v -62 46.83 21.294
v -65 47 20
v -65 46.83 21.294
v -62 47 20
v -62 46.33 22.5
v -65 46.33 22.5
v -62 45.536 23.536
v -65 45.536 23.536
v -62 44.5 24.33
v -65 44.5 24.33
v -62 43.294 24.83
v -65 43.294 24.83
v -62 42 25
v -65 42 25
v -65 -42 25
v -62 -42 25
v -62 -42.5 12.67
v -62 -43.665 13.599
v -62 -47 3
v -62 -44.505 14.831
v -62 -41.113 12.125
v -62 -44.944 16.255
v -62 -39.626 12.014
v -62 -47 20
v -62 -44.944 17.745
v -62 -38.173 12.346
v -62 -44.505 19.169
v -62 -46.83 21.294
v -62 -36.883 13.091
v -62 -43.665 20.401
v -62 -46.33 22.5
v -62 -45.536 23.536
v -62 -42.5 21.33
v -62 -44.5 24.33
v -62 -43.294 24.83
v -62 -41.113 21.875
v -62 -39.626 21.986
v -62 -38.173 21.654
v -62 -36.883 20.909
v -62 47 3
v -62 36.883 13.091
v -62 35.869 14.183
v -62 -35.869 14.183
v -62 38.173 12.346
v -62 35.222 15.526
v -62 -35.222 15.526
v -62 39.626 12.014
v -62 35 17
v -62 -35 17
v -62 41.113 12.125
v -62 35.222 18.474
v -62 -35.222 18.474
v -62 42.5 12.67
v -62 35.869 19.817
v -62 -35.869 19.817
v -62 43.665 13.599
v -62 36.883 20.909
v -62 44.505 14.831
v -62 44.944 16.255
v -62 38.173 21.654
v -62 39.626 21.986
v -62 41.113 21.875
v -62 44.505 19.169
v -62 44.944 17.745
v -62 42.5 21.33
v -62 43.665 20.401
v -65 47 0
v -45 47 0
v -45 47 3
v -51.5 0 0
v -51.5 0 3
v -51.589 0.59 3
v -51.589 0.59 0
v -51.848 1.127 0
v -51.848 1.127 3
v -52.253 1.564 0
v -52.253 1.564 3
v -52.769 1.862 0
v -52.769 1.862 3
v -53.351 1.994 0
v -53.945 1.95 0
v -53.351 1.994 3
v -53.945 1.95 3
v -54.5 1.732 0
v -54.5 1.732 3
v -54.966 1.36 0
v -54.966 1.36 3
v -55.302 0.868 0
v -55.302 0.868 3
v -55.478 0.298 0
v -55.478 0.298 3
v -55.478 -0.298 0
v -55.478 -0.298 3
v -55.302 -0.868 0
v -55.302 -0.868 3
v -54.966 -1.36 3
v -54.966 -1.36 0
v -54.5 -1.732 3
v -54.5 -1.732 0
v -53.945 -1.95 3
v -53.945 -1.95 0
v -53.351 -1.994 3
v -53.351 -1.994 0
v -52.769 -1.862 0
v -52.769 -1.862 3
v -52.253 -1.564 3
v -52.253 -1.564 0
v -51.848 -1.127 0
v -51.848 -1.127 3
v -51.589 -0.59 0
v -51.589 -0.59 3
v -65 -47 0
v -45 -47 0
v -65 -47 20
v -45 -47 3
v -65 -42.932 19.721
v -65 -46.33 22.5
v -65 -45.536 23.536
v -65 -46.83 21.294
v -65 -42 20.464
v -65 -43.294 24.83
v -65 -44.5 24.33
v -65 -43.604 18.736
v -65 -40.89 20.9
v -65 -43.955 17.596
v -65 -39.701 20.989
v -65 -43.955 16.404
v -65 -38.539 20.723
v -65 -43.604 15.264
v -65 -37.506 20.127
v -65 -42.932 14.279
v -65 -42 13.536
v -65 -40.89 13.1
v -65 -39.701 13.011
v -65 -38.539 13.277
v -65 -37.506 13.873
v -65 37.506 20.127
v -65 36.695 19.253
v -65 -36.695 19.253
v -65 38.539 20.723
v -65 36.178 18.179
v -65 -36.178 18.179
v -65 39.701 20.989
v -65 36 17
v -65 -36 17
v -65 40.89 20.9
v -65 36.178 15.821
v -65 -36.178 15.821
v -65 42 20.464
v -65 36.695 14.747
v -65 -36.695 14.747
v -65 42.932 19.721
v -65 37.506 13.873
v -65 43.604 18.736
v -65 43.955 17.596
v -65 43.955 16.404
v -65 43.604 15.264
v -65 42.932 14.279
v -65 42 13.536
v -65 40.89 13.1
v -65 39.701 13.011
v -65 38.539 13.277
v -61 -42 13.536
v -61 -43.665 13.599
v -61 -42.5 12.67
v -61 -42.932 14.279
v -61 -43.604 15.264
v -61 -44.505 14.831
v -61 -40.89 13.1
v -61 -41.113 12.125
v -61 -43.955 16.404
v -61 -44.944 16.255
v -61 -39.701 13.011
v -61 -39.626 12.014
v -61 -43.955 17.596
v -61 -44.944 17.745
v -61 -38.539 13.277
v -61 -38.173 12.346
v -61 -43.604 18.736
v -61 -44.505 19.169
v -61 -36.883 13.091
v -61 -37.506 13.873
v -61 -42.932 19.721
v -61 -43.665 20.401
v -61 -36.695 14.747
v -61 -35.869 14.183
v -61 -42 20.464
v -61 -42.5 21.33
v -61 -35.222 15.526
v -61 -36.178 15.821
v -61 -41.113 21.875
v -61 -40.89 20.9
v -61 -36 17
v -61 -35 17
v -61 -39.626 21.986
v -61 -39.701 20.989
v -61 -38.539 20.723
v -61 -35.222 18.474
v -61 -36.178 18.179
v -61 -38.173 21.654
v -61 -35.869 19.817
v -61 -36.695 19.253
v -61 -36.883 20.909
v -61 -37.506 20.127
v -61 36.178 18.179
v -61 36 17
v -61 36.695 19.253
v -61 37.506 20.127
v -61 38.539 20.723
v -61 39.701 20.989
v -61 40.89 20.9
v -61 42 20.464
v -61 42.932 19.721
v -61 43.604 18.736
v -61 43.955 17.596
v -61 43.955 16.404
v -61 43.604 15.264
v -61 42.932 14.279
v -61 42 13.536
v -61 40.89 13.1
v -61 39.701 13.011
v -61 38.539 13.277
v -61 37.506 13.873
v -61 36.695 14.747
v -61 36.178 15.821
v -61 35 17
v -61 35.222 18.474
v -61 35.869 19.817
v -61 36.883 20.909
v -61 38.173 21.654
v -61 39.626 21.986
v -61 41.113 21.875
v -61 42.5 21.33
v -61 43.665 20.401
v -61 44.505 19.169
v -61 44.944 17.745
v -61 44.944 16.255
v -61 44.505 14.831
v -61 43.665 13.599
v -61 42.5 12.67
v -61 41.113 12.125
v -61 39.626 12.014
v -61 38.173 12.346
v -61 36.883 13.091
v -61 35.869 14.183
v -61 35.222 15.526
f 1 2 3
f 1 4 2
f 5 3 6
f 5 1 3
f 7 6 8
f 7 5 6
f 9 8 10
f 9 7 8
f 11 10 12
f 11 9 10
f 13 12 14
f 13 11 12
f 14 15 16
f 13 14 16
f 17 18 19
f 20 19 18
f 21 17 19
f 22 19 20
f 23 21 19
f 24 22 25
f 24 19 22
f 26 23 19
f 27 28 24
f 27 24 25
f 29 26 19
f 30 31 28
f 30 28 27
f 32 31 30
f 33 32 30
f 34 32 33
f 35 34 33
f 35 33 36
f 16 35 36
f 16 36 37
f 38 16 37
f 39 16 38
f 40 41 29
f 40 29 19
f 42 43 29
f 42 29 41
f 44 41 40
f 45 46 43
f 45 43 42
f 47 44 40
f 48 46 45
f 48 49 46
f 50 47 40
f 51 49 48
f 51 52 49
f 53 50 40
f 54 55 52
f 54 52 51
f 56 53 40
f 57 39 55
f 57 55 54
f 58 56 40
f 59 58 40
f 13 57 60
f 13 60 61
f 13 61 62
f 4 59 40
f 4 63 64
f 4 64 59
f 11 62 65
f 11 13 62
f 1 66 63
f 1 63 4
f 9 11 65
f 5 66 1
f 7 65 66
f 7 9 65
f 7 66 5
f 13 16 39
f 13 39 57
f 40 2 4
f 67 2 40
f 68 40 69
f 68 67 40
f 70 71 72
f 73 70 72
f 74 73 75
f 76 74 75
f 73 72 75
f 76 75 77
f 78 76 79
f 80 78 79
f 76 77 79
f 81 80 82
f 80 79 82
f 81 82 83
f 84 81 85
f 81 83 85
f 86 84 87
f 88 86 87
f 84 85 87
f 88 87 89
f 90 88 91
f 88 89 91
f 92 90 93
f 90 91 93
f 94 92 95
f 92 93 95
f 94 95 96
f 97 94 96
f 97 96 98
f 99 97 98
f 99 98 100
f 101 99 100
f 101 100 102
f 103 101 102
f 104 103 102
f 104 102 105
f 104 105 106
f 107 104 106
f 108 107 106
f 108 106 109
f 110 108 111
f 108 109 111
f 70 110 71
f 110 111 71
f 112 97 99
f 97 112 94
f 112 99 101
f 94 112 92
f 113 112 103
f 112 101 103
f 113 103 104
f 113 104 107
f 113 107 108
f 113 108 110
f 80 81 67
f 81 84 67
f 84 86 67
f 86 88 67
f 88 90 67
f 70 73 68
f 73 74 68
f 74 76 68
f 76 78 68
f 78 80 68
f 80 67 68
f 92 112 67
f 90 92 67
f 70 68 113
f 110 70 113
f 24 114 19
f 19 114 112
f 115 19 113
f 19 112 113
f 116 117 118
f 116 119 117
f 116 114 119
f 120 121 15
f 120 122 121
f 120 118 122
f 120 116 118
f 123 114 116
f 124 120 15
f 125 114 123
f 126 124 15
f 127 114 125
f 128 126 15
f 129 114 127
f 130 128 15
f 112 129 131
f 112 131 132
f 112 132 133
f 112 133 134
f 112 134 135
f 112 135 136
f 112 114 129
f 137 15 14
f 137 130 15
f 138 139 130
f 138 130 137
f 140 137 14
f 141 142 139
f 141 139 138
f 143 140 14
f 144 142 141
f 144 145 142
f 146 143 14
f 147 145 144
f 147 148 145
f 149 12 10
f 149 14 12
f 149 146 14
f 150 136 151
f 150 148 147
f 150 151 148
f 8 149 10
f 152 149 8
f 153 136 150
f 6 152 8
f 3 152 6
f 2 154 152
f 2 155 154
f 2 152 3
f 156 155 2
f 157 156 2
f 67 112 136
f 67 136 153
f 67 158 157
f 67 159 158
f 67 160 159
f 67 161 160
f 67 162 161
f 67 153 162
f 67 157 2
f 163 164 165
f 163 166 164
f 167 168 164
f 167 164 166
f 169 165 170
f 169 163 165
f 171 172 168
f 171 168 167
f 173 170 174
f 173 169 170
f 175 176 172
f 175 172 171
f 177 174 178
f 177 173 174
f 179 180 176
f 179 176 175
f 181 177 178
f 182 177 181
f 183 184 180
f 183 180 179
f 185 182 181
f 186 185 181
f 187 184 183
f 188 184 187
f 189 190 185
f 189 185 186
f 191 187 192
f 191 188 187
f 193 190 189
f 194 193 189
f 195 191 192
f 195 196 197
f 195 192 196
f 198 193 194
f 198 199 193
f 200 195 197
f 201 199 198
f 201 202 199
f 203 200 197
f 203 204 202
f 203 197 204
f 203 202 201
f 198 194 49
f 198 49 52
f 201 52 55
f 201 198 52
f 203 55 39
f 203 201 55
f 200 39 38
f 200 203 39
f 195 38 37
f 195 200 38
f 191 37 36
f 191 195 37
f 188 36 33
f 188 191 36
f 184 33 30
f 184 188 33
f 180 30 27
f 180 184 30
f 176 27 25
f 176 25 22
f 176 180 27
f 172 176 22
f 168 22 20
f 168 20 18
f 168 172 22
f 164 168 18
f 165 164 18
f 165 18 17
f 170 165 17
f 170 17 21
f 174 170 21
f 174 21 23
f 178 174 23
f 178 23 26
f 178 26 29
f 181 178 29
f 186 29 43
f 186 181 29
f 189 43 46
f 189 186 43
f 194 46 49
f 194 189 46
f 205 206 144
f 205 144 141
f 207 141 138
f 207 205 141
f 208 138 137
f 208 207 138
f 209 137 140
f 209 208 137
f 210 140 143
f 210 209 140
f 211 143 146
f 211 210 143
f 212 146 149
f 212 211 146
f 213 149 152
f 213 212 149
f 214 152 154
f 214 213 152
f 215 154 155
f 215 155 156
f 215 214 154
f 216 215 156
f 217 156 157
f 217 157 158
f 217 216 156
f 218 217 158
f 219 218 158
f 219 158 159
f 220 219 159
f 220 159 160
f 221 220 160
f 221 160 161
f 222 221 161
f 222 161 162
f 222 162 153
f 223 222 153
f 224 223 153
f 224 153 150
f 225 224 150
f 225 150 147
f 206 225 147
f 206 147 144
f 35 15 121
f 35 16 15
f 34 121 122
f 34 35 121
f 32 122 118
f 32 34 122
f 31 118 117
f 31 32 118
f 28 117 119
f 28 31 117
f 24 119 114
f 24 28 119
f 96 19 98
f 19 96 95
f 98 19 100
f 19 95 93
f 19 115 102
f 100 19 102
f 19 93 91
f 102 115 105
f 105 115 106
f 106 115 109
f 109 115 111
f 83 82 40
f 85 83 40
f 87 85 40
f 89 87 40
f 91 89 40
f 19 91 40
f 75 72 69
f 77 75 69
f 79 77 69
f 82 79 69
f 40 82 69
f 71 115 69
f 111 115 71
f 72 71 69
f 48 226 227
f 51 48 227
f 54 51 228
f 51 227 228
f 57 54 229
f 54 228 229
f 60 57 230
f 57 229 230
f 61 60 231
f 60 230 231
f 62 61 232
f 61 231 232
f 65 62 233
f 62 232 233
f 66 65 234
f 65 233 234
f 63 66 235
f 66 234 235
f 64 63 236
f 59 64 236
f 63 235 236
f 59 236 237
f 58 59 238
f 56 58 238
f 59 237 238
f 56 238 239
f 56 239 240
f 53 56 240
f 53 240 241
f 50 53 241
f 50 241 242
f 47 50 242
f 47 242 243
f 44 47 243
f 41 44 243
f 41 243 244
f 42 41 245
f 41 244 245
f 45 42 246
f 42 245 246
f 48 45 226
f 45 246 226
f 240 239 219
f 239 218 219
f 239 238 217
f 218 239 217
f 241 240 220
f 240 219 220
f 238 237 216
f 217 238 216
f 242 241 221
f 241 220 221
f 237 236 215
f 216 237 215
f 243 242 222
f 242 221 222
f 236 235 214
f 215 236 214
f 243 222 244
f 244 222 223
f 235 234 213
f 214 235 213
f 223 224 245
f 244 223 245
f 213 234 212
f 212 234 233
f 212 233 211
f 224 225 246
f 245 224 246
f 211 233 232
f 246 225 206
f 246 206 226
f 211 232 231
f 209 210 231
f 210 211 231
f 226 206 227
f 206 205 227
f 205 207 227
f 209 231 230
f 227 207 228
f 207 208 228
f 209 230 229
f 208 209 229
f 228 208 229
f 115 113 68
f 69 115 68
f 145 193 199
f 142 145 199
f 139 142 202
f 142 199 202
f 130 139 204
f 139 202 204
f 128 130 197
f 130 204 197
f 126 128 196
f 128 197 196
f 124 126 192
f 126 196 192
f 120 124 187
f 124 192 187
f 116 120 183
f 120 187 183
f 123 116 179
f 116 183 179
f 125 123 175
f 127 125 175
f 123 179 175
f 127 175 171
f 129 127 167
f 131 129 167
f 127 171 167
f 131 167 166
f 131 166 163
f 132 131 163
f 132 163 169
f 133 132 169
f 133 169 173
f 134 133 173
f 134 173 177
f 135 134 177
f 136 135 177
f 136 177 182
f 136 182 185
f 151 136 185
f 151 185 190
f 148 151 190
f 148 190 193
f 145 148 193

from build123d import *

# Parameters (mm, degrees)
F0_W     = 20
F0_H     = 94
F1_DEPTH = 25
F2_R     = 5
F2_R_2   = 4
F3_DEPTH = 17
F4_DEPTH = 20
F5_START = -16
F5_DEPTH = 1
F6_R     = 5
F7_R     = 2
F8_DEPTH = 3


# Not quite as in the source:
# - a pattern or mirror of a feature is missing from the dataset's text; its kind, count and spacing are read off the source's solid


with BuildPart() as f1:
    # F0 (on Top) → F1 (new body)
    with BuildSketch(Plane.XY):
        with Locations((-55, 0)):
            Rectangle(F0_W, F0_H)
    extrude(amount=F1_DEPTH)

    # F2 (on face) → F3 (cut)
    with BuildSketch(Plane.YZ.offset(-45)):
        with BuildLine():
            Line((-32.4501655647, 25), (-47, 25))
            Line((-47, 25), (-47, 8.5147186258))
            ThreePointArc((-47, 8.5147186258), (-35.3095842402, 7.0501256289), (-29, 17))
            ThreePointArc((-29, 17), (-29.8993025293, 21.3561348241), (-32.4501655647, 25))
        make_face()
        with Locations((-40, 17)):
            Circle(F2_R, mode=Mode.SUBTRACT)
        with BuildLine():
            Line((-29.753049234, 25), (-32.4501655647, 25))
            ThreePointArc((-32.4501655647, 25), (-29.8993025293, 21.3561348241), (-29, 17))
            ThreePointArc((-29, 17), (-35.3095842402, 7.0501256289), (-47, 8.5147186258))
            Line((-47, 8.5147186258), (-47, 6.0455488499))
            ThreePointArc((-47, 6.0455488499), (-33.7550020016, 5.598245749), (-27, 17))
            ThreePointArc((-27, 17), (-27.7075153049, 21.2302269468), (-29.753049234, 25))
        make_face()
        with BuildLine():
            Line((47, 25), (-29.753049234, 25))
            ThreePointArc((-29.753049234, 25), (-27.7075153049, 21.2302269468), (-27, 17))
            ThreePointArc((-27, 17), (-33.7550020016, 5.598245749), (-47, 6.0455488499))
            Line((-47, 6.0455488499), (-47, 3))
            Line((-47, 3), (47, 3))
            Line((47, 3), (47, 25))
        make_face()
        with Locations((-40, 17)):
            Circle(F2_R)
        with Locations((-40, 17)):
            Circle(F2_R_2, mode=Mode.SUBTRACT)
    extrude(amount=-F3_DEPTH, mode=Mode.SUBTRACT)

    # F2 (on face) → F4 (cut, through all)
    with BuildSketch(Plane.YZ.offset(-45)):
        with Locations((-40, 17)):
            Circle(F2_R_2)
    f4 = extrude(amount=-F4_DEPTH, mode=Mode.SUBTRACT)

    # F4_copies: F4 across plane
    add(f4.mirror(Plane.ZX), mode=Mode.SUBTRACT)

    # F2 (on face) → F5 (join)
    with BuildSketch(Plane.YZ.offset(-45).offset(F5_START)):
        with Locations((-40, 17)):
            Circle(F2_R)
        with Locations((-40, 17)):
            Circle(F2_R_2, mode=Mode.SUBTRACT)
    f5 = extrude(amount=-F5_DEPTH)

    # F5_copies: F5 across plane
    add(f5.mirror(Plane.ZX))

    # F6
    f6_edges = [f1.edges().sort_by_distance(p)[0] for p in [
        (-63.5, -47, 25),
        (-63.5, 47, 25),
    ]]
    fillet(f6_edges, radius=F6_R)

    # F7 (on face) → F8 (cut, through all)
    with BuildSketch(Plane.XY.offset(3)):
        with Locations((-53.5, 0)):
            Circle(F7_R)
    extrude(amount=-F8_DEPTH, mode=Mode.SUBTRACT)


solid = f1.part
